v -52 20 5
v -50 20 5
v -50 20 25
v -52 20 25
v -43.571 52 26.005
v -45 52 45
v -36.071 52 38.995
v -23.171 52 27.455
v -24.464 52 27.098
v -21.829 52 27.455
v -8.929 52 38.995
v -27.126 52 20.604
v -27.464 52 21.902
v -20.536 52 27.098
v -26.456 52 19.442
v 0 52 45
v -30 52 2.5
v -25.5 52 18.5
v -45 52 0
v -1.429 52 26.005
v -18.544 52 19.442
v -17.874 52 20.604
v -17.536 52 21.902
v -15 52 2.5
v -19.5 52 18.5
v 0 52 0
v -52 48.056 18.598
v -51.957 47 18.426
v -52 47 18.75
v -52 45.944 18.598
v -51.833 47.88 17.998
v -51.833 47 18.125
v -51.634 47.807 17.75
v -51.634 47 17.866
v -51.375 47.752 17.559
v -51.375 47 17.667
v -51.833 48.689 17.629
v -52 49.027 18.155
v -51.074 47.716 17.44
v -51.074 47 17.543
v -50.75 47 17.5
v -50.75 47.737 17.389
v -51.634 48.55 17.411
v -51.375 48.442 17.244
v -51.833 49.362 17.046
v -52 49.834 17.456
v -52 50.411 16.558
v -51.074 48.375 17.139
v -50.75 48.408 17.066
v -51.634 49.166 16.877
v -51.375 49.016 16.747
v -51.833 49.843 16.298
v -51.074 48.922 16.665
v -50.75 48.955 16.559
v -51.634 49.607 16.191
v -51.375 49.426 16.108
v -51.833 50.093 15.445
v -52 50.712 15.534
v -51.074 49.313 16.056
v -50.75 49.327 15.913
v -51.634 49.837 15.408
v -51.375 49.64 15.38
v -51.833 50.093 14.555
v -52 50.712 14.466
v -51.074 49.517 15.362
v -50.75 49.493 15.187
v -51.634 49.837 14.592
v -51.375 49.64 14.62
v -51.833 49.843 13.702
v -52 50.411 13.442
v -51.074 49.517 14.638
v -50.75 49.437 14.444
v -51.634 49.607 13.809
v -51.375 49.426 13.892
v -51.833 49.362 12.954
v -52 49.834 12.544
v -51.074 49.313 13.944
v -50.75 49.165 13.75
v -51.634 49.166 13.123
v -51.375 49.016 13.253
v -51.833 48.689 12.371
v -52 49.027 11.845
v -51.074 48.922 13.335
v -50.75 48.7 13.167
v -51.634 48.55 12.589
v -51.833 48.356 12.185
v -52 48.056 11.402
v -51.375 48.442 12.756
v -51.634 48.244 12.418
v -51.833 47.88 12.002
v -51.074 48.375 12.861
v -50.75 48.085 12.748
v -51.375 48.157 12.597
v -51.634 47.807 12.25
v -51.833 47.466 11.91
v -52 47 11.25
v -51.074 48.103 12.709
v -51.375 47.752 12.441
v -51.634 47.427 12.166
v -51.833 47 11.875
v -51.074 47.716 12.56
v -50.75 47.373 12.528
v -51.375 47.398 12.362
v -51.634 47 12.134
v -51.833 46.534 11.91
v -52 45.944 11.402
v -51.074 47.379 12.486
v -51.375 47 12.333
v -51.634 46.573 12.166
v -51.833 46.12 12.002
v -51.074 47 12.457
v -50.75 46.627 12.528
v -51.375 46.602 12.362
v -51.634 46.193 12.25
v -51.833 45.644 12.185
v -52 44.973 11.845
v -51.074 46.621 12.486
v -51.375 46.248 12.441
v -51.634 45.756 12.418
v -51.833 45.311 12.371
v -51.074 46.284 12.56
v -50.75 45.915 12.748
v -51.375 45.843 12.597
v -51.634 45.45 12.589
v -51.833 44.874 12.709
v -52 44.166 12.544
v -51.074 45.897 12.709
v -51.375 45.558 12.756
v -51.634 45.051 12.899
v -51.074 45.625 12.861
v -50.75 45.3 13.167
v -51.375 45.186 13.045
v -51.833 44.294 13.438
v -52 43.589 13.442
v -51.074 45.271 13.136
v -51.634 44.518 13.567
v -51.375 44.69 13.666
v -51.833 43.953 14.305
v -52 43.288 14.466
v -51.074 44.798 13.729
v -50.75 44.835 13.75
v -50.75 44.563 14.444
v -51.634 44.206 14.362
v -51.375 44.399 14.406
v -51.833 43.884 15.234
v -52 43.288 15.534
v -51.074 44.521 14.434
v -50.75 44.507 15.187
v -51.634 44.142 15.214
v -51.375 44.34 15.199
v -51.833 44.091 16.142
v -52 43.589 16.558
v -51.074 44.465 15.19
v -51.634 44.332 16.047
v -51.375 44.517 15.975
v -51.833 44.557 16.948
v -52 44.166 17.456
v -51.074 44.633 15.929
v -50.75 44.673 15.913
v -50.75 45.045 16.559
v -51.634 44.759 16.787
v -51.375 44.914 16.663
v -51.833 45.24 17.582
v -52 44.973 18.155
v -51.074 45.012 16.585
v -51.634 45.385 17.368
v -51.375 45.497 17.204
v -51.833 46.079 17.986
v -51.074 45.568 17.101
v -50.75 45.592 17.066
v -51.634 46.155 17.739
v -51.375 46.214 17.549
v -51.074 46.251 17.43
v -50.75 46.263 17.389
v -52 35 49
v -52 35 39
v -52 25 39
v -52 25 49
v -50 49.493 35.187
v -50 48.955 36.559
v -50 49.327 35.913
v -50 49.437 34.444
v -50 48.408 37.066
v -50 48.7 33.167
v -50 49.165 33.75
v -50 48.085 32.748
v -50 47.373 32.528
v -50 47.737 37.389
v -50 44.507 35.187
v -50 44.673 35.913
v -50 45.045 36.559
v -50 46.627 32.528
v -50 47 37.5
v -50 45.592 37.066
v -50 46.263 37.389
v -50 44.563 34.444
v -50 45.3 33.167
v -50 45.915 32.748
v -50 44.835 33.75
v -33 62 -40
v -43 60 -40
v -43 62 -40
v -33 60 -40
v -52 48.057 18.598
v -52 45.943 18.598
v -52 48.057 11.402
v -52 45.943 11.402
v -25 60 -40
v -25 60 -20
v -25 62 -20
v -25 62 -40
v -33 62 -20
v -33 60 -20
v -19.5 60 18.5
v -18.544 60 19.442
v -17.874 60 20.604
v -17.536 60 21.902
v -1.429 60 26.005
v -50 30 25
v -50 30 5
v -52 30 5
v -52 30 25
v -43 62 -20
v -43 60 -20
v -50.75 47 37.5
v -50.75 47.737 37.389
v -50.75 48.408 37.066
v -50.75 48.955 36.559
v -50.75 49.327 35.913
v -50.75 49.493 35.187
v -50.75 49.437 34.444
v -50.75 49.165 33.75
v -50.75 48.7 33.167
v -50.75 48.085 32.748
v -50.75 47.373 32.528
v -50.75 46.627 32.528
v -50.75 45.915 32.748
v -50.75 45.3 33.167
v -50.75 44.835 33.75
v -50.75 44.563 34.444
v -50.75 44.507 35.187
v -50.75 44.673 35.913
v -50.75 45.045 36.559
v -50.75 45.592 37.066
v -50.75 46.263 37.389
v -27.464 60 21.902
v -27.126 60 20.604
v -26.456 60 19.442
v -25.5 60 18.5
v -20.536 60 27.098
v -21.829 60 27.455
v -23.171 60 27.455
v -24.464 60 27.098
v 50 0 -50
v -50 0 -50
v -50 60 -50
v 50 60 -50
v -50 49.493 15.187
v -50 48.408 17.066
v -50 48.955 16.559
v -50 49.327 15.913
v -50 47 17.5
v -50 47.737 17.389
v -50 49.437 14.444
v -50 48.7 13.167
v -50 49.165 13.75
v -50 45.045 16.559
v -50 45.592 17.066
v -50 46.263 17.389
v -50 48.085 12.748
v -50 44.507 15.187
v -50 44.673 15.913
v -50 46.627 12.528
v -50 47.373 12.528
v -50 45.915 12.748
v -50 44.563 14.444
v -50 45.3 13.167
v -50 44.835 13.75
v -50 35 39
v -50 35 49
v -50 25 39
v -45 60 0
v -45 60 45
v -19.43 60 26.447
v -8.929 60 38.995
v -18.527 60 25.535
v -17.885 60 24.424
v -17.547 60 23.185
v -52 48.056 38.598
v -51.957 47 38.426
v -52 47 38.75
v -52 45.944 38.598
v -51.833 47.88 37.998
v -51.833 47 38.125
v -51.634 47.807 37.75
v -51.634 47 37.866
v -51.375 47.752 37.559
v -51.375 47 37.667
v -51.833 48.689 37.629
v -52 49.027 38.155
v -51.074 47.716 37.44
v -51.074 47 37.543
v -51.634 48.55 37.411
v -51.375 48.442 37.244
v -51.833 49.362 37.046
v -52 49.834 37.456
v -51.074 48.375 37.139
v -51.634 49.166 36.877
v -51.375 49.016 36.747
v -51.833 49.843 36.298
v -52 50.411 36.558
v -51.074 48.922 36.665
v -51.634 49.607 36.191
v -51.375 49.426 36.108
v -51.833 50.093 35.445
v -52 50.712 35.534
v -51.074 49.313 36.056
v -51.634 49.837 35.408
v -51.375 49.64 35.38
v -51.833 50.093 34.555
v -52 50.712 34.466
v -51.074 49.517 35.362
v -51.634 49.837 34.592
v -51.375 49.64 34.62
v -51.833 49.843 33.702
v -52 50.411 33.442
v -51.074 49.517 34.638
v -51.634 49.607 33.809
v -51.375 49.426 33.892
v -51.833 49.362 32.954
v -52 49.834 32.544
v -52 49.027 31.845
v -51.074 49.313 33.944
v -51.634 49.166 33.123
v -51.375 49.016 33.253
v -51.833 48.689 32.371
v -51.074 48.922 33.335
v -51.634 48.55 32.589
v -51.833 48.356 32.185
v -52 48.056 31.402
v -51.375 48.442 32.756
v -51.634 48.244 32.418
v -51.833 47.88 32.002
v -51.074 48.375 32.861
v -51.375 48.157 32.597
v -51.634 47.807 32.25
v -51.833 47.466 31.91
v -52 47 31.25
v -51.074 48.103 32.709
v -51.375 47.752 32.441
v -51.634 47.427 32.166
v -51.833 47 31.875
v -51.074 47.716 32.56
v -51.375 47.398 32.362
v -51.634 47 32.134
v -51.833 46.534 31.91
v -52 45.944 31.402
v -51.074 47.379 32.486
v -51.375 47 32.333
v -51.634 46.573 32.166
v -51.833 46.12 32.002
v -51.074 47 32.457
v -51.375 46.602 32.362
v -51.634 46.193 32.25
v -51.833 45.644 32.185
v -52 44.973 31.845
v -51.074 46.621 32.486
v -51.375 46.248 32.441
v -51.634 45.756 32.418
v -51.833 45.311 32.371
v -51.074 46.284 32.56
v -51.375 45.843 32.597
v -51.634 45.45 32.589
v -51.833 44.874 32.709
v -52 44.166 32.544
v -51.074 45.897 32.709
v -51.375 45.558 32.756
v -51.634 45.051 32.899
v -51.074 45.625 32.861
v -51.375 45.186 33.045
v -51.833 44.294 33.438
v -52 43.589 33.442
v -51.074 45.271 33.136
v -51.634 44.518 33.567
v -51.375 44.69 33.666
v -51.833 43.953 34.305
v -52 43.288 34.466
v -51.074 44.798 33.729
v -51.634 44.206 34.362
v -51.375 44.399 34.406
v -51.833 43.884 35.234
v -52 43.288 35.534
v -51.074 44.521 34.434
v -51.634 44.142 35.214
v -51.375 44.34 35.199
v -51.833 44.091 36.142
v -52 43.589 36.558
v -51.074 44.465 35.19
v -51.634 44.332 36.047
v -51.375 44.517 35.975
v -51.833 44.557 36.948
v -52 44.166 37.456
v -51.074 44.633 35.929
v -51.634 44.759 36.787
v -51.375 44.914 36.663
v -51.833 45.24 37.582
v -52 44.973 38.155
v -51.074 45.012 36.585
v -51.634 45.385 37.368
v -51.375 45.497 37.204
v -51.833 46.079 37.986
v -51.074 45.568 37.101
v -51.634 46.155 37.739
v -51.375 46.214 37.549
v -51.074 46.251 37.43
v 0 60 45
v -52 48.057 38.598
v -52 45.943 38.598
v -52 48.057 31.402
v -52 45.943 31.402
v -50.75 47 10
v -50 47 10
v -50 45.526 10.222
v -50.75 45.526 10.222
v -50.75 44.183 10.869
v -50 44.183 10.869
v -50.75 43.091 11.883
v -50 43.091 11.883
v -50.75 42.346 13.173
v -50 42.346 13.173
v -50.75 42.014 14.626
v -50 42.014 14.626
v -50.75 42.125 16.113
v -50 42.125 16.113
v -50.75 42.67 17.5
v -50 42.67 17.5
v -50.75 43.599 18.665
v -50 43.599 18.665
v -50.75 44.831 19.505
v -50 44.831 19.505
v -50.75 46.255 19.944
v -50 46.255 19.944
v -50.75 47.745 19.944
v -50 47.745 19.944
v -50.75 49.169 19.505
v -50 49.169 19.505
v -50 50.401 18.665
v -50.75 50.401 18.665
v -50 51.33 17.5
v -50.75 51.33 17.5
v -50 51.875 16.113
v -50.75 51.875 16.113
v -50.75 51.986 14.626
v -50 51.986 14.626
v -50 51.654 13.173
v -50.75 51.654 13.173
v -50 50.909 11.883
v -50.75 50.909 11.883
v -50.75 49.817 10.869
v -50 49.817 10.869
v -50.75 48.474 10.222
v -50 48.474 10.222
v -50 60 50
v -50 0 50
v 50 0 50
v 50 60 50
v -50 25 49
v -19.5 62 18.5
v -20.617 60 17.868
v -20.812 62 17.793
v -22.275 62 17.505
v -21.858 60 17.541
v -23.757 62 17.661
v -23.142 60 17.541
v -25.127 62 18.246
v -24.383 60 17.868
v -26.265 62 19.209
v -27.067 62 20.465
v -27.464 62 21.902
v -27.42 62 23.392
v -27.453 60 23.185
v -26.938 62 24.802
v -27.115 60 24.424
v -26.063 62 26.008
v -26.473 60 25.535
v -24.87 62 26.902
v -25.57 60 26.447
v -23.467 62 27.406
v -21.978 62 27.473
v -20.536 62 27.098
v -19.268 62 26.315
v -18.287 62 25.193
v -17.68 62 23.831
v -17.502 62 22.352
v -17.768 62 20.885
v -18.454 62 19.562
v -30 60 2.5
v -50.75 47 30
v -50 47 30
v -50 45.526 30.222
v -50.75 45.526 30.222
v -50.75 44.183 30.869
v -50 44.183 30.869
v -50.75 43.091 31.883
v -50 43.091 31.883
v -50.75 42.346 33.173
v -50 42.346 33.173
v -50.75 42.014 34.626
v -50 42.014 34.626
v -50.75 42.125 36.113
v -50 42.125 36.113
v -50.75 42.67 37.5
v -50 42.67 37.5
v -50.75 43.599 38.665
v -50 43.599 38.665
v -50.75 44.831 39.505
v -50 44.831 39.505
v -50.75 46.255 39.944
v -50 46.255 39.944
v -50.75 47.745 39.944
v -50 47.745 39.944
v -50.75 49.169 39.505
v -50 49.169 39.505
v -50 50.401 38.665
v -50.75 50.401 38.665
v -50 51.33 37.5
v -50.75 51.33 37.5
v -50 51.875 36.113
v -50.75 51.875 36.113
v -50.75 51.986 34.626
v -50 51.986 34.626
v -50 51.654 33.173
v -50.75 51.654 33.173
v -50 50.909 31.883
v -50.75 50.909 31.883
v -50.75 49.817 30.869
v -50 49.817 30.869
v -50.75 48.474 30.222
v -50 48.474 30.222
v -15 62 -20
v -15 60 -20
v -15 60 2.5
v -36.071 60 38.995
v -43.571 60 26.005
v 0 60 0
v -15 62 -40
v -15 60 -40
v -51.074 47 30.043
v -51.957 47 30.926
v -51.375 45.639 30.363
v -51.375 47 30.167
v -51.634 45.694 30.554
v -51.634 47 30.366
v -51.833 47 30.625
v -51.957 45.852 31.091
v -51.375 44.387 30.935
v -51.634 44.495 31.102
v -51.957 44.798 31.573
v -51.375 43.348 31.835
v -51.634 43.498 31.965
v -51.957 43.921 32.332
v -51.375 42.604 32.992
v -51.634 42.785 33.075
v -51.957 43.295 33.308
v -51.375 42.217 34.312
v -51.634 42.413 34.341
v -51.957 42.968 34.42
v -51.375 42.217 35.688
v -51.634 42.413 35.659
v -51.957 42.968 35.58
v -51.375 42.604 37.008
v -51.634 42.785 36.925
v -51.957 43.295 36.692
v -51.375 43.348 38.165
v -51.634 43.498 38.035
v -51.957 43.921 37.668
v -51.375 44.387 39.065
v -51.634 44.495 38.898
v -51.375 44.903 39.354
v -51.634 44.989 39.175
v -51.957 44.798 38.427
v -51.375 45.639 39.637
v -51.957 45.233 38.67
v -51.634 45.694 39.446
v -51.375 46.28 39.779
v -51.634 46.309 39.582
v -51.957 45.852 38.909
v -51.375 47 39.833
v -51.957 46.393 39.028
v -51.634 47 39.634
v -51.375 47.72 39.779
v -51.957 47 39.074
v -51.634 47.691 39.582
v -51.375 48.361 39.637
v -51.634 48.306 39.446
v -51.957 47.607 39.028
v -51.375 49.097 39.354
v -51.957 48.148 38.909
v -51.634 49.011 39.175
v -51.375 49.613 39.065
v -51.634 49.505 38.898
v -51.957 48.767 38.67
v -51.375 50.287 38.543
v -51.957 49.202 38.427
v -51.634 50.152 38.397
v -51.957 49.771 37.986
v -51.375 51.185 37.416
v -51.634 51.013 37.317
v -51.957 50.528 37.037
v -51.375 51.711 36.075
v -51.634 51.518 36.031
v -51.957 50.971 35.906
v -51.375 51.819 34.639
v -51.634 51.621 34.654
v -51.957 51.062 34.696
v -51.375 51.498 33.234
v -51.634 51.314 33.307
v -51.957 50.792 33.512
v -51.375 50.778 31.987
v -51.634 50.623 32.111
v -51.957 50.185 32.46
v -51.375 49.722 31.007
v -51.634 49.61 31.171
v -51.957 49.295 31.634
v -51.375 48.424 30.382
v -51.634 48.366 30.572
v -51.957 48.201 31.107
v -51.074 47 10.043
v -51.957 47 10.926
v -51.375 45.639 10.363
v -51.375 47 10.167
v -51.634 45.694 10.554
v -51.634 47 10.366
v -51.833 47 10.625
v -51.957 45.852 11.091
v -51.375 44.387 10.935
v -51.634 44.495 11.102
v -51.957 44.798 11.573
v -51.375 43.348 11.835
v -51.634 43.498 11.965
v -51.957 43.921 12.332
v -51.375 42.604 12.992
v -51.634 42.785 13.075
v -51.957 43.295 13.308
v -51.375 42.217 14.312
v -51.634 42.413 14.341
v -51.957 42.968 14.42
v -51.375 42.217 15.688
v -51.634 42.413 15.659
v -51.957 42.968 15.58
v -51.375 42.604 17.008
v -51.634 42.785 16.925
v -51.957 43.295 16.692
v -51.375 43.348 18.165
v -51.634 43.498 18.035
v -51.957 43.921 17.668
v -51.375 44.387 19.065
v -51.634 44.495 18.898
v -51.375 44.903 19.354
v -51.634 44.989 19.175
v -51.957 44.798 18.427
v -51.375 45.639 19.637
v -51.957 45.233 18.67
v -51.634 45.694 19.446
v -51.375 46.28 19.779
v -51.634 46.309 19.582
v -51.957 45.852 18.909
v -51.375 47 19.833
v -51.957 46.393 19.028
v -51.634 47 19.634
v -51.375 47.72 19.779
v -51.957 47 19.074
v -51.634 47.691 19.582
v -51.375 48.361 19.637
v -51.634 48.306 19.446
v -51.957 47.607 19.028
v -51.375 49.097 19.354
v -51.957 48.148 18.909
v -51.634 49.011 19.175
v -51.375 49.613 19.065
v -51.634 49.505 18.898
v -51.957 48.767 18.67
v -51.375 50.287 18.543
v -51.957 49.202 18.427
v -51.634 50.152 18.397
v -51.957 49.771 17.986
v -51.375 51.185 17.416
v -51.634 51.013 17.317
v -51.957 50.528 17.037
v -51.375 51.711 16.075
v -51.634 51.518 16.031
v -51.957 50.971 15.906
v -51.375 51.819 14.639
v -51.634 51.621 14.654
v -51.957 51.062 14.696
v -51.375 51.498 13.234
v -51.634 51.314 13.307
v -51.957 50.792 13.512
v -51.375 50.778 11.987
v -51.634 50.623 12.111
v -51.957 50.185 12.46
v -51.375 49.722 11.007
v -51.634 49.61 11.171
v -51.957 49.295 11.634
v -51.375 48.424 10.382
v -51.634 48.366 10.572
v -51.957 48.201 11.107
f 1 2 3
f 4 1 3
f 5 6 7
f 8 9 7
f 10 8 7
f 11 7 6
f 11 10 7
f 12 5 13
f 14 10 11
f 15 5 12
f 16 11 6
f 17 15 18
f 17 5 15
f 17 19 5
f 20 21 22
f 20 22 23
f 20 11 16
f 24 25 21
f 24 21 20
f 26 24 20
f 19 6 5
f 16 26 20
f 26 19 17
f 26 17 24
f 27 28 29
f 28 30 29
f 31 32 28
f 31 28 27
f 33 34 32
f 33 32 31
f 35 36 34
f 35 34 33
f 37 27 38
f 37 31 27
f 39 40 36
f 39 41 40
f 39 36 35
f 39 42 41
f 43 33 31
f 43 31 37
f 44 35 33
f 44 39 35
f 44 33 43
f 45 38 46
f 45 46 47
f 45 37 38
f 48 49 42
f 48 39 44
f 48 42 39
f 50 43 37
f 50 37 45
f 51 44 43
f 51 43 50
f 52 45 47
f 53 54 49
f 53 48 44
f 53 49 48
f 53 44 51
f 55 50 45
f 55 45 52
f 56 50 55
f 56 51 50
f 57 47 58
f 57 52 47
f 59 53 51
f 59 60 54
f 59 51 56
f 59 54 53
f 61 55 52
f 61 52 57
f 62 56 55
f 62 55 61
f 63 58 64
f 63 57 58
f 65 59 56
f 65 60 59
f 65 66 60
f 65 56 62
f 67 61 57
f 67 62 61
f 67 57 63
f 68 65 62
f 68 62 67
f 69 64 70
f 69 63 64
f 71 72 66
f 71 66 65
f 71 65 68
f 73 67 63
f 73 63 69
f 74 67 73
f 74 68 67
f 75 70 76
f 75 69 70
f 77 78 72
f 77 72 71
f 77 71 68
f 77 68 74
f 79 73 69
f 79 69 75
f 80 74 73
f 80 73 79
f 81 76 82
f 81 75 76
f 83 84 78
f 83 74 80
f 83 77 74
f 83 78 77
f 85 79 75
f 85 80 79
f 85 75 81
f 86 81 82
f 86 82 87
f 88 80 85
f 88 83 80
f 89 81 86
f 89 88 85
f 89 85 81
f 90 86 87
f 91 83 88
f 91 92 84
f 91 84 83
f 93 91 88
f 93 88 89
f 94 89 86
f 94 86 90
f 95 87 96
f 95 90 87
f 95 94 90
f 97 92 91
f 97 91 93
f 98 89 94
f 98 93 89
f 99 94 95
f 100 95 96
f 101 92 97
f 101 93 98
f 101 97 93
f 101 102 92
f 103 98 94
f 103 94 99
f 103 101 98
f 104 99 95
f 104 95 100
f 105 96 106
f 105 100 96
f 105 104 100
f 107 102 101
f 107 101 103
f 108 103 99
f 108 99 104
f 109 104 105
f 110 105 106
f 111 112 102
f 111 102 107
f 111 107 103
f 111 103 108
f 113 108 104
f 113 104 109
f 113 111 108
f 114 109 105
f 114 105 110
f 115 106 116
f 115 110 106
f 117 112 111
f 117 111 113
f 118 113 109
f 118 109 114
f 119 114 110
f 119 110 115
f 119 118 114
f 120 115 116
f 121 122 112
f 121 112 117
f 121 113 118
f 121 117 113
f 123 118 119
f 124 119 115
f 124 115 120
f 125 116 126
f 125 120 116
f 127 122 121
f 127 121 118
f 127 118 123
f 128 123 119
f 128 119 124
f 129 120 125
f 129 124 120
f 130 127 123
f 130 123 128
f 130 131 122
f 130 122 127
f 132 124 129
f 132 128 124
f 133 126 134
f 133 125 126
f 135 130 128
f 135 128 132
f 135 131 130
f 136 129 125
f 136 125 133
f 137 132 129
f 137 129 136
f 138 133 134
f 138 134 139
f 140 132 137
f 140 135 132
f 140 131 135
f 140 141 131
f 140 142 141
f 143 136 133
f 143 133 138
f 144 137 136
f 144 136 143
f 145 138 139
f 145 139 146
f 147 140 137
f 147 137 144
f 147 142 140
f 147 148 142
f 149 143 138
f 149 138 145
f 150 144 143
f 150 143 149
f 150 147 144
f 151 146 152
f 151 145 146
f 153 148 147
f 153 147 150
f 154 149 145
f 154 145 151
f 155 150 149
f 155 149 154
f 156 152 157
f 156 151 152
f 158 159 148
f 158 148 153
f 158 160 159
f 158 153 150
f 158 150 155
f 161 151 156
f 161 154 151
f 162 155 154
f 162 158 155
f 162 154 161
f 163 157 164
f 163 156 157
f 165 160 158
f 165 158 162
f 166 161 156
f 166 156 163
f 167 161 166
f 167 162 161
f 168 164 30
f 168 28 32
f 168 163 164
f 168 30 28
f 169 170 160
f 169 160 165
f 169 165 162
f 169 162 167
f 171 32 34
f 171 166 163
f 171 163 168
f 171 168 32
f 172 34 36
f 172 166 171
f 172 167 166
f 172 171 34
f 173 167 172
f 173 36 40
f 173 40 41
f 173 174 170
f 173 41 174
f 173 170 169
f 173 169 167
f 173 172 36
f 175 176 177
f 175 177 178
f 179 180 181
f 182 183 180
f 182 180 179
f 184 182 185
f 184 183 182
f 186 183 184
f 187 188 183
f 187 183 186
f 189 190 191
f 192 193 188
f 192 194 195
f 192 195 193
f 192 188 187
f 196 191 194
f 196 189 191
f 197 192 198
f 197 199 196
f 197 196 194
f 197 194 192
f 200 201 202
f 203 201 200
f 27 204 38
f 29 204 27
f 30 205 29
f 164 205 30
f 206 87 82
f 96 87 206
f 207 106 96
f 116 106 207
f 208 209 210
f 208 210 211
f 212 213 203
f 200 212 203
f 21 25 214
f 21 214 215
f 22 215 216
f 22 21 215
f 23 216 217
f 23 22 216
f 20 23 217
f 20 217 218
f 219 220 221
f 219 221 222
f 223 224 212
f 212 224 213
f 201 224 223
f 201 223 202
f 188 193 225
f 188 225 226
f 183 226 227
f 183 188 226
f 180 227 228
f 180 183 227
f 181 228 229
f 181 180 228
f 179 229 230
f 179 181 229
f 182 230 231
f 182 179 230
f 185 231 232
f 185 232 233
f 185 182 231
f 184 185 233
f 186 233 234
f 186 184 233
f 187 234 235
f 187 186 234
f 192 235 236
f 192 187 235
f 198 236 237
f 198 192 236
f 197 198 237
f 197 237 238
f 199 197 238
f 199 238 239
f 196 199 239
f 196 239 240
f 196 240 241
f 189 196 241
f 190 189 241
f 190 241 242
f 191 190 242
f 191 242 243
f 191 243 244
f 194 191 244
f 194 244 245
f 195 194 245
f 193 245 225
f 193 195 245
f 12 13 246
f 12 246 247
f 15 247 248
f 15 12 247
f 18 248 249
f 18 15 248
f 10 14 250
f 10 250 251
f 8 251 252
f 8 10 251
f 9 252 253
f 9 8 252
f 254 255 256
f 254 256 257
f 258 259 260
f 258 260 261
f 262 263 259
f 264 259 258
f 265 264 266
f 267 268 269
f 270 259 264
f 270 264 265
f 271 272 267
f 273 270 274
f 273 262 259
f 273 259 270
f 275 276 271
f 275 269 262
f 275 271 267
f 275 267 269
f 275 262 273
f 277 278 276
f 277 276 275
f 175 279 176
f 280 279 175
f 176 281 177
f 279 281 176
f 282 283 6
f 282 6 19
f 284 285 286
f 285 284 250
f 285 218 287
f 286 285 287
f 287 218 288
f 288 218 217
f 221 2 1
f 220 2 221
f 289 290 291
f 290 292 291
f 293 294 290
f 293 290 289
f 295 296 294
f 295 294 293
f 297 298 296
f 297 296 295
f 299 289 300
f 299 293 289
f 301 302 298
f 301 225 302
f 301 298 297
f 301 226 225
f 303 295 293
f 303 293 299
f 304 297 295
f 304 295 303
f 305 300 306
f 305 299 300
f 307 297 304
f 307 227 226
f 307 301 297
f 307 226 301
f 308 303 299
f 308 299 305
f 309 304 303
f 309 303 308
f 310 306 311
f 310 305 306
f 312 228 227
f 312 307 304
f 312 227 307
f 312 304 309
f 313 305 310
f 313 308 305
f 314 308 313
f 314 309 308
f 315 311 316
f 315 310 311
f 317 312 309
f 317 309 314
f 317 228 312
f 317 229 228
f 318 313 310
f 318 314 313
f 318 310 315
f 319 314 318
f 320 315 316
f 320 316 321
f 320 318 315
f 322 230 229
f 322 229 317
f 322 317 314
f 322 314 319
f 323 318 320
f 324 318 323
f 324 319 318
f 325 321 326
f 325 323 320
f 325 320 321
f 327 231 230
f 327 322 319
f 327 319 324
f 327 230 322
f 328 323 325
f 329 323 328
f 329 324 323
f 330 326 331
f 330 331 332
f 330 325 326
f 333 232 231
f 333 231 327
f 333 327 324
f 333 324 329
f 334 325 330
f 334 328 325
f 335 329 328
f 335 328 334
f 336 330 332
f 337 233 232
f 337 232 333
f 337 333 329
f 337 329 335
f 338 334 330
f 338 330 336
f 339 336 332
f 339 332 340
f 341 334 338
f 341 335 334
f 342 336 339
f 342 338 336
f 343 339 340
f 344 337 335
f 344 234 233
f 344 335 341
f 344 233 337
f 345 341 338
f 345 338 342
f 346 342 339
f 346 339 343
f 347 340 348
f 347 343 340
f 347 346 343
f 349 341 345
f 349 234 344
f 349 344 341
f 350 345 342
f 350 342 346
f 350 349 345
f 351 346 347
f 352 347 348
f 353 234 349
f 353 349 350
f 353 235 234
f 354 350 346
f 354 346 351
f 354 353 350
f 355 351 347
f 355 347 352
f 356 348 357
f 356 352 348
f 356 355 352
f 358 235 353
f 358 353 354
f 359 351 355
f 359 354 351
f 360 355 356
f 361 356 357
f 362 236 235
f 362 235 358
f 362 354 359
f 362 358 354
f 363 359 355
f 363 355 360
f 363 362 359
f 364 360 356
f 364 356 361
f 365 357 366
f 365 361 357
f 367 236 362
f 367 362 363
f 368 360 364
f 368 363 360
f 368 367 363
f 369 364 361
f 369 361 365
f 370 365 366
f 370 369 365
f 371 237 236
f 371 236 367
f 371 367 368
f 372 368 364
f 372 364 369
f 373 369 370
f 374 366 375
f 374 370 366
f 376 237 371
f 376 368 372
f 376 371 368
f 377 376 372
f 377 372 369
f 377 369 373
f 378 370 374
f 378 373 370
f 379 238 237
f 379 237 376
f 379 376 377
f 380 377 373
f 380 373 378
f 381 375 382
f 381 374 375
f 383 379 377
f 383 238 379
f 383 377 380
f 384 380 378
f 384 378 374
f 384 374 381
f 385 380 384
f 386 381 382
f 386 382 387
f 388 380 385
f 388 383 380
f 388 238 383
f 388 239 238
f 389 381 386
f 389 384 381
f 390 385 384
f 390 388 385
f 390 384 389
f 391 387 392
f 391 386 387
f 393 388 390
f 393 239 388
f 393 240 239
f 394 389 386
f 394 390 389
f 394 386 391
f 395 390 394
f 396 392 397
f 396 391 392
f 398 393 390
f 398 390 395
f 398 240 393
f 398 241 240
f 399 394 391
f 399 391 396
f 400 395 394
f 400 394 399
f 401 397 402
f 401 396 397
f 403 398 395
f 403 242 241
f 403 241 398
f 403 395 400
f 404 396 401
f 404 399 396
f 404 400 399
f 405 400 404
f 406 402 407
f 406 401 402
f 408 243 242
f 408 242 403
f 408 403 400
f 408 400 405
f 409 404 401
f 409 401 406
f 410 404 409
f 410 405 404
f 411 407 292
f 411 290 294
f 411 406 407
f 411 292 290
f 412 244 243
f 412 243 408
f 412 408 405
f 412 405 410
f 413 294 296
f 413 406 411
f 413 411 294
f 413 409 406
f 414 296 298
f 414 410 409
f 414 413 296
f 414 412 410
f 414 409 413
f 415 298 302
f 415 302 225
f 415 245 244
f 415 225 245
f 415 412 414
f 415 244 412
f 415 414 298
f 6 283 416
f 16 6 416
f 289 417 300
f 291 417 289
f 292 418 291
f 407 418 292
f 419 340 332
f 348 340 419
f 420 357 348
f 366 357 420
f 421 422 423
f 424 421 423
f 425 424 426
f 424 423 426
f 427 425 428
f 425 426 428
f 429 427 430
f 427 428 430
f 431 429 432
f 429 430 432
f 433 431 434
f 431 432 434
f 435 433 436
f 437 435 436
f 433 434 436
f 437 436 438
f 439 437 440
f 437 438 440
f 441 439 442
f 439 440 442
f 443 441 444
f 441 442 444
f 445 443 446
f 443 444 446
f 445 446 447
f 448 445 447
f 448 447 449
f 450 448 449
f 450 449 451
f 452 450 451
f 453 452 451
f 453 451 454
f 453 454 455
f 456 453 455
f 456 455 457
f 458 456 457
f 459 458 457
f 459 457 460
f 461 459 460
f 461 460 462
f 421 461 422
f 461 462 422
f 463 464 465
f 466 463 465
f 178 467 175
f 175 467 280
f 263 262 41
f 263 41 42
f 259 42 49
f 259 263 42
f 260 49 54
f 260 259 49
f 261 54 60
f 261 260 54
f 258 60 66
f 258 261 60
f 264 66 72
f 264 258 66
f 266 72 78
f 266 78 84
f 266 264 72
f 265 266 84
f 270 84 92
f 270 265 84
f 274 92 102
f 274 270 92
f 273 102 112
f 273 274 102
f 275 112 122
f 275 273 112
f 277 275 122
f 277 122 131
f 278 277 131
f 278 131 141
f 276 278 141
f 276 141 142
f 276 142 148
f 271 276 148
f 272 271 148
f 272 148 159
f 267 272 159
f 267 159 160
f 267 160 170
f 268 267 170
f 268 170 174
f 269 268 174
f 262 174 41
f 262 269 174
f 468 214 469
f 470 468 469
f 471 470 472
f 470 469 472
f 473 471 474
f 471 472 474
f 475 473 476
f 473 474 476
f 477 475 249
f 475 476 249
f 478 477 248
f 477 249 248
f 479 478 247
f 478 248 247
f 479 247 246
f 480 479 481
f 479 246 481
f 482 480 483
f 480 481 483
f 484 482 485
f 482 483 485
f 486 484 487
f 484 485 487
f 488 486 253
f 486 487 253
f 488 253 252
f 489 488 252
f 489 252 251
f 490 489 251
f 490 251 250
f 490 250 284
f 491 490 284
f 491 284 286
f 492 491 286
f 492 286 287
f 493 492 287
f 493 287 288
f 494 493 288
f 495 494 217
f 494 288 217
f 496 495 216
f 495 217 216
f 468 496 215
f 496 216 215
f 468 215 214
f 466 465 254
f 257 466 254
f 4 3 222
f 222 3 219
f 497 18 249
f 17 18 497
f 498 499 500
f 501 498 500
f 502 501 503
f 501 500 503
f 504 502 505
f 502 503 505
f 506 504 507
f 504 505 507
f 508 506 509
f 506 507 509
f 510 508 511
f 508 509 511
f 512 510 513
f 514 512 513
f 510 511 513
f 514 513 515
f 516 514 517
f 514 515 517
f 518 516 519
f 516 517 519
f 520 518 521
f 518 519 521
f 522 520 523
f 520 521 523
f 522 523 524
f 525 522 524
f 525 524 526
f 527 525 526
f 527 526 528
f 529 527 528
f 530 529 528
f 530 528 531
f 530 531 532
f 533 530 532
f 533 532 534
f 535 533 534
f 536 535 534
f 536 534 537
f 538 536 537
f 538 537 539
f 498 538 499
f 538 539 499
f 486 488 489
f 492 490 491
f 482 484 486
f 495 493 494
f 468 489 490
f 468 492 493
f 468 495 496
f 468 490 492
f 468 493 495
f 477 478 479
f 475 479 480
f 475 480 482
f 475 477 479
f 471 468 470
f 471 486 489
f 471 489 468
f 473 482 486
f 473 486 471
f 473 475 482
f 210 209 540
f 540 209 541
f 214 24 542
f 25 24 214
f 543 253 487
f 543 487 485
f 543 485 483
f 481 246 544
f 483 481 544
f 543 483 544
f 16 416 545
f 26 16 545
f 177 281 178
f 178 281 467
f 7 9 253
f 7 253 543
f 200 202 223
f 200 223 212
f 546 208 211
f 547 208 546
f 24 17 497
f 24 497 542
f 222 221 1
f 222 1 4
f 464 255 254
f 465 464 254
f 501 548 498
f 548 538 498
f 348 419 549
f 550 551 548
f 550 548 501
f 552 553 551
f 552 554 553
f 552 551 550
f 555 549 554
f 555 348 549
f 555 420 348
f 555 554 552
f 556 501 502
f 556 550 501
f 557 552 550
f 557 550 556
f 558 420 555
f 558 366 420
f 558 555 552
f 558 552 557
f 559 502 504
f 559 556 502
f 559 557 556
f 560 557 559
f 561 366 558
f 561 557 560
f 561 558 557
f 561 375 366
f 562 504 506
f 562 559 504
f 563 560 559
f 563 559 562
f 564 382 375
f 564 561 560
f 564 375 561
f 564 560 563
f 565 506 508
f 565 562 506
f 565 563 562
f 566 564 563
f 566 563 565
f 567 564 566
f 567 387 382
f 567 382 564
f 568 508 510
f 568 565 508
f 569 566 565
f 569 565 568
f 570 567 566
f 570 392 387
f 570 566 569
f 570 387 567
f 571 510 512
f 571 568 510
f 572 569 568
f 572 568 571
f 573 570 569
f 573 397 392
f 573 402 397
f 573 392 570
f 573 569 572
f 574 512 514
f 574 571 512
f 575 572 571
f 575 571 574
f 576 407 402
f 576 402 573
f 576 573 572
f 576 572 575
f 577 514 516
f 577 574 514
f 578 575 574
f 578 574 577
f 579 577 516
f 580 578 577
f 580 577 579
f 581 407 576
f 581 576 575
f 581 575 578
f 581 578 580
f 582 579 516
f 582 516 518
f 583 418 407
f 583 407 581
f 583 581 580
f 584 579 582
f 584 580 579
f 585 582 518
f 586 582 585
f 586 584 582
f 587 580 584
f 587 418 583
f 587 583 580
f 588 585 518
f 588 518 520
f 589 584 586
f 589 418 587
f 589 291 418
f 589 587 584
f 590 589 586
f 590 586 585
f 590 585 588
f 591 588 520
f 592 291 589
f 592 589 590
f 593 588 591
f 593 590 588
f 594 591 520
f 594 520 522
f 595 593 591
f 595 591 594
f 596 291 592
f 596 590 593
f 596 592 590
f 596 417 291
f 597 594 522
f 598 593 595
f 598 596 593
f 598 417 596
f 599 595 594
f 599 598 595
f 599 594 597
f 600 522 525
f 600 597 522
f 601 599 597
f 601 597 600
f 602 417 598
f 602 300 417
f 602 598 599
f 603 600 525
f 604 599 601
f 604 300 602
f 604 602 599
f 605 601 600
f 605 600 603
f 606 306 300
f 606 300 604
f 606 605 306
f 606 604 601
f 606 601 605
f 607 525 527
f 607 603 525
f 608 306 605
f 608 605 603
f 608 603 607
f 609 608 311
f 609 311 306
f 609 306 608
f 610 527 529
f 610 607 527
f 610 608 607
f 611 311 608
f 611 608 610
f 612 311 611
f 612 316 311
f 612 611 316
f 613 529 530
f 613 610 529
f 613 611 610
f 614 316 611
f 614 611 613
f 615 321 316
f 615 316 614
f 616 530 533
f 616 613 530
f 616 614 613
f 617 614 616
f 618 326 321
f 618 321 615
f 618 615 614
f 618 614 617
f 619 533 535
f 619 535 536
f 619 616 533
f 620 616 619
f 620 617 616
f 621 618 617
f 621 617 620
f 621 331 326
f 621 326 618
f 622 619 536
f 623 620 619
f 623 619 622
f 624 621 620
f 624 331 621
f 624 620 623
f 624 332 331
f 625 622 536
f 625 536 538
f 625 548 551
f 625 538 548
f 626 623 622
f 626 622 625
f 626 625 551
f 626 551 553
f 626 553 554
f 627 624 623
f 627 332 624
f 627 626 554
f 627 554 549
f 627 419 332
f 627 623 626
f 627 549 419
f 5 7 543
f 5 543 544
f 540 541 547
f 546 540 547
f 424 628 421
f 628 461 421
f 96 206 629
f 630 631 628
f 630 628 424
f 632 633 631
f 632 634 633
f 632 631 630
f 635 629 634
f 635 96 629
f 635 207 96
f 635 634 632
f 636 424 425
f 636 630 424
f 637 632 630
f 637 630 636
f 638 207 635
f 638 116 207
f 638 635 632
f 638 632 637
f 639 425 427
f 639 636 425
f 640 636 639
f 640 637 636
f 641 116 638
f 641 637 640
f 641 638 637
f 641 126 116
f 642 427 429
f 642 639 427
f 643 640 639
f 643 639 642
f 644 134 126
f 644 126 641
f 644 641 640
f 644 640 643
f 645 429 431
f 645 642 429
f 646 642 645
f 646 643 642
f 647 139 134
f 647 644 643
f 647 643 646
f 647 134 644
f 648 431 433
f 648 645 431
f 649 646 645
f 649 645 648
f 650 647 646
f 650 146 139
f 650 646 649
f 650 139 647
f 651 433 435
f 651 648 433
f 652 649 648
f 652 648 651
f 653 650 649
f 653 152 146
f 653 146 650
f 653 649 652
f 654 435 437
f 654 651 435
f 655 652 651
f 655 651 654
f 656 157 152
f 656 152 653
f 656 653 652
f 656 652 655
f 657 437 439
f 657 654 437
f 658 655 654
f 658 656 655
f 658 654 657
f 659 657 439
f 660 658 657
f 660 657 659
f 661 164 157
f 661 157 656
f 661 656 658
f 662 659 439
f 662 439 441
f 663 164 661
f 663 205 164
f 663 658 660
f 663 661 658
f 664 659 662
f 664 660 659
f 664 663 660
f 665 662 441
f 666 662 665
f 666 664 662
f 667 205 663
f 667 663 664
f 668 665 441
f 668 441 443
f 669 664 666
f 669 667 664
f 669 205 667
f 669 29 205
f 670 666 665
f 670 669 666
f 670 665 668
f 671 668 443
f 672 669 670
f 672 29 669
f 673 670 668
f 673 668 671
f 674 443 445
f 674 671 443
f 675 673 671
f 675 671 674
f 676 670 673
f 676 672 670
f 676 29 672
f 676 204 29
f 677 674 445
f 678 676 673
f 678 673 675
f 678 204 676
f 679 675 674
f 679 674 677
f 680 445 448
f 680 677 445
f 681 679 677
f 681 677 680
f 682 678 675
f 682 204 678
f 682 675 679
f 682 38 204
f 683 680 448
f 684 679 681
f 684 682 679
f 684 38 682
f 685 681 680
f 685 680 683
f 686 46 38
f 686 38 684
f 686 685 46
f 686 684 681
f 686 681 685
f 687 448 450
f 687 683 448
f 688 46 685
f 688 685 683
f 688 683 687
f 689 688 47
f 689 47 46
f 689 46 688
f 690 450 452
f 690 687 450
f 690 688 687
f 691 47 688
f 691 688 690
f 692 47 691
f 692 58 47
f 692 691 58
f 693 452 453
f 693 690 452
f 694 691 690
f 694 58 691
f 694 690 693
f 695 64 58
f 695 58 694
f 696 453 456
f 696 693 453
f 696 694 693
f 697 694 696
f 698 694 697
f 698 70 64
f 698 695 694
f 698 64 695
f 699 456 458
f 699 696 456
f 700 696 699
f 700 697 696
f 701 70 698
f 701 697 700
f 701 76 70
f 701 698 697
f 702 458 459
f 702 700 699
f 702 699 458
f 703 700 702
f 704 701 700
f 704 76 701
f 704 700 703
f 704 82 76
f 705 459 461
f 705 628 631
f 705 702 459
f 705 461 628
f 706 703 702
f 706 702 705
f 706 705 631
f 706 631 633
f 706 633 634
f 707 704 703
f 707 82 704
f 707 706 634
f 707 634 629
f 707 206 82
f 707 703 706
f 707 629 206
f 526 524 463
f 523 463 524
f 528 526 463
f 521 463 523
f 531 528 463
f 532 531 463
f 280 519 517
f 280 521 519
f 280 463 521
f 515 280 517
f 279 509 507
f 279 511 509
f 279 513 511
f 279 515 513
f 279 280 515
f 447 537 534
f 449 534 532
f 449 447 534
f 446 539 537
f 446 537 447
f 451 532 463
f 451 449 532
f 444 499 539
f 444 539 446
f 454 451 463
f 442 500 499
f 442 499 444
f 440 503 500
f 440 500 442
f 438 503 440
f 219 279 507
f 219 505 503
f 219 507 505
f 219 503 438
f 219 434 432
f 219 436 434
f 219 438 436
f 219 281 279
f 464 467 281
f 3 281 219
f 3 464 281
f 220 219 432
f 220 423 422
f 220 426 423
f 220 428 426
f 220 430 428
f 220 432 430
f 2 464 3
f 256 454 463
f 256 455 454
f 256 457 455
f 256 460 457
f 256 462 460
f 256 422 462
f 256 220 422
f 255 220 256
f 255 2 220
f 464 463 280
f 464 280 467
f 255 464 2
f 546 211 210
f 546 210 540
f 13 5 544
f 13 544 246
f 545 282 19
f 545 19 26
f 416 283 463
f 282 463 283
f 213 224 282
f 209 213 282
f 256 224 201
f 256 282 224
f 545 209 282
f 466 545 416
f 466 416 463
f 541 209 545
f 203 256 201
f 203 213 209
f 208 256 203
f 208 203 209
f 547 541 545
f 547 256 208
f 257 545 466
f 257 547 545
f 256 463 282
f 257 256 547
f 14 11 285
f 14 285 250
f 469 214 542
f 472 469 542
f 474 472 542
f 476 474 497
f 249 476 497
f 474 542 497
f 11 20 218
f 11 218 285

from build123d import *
from build123d.topology import SkipClean

# Parameters (mm, degrees)
SKETCH_1_W          = 100
SKETCH_1_H          = 100
EXTRUDE_1_DEPTH     = 60
SKETCH_2_W          = 45
SKETCH_2_H          = 45
CUT_EXTRUDE_1_DEPTH = 8
SKETCH_3_W          = 10
SKETCH_3_H          = 20
EXTRUDE_2_DEPTH     = 2
SKETCH_4_W          = 20
SKETCH_4_H          = 10
SKETCH_4_W_2        = 10
EXTRUDE_3_DEPTH     = 2
SKETCH_5_R          = 5
SKETCH_5_R_2        = 2.5
EXTRUDE_4_DEPTH     = 2
FILLET_1_R          = 1.25
FILLET_2_R          = 1.25
EXTRUDE_5_DEPTH     = 8
SKETCH_7_R          = 5
EXTRUDE_6_DEPTH     = 2


with BuildPart() as part:
    # 草图1 → 凸台-拉伸1 (new body)
    with BuildSketch(Plane(origin=(0, 0, 0), x_dir=(1, 0, 0), z_dir=(0, 1, 0))):
        Rectangle(SKETCH_1_W, SKETCH_1_H)
    extrude(amount=EXTRUDE_1_DEPTH)

    # 草图2 → 切除-拉伸1 (cut)
    with BuildSketch(Plane(origin=(0, 60, 0), x_dir=(1, 0, 0), z_dir=(0, 1, 0))):
        with Locations((-22.5, -22.5)):
            Rectangle(SKETCH_2_W, SKETCH_2_H)
    extrude(amount=-CUT_EXTRUDE_1_DEPTH, mode=Mode.SUBTRACT)

    # 草图3 → 凸台-拉伸2 (add)
    with BuildSketch(Plane(origin=(0, 60, 0), x_dir=(1, 0, 0), z_dir=(0, 1, 0))):
        with Locations((-38, 30)):
            Rectangle(SKETCH_3_W, SKETCH_3_H)
        with Locations((-20, 30)):
            Rectangle(SKETCH_3_W, SKETCH_3_H)
    extrude(amount=EXTRUDE_2_DEPTH)

    # 草图4 → 凸台-拉伸3 (add)
    with BuildSketch(Plane.ZY.offset(50)):
        with Locations((15, 25)):
            Rectangle(SKETCH_4_W, SKETCH_4_H)
        with Locations((44, 30)):
            Rectangle(SKETCH_4_W_2, SKETCH_4_H)
    extrude(amount=EXTRUDE_3_DEPTH)

    # 草图5 → 凸台-拉伸4 (add)
    # profile 1 of 2: a face of its own
    with BuildSketch(Plane.ZY.offset(50)):
        with Locations(Location((15, 47, 0), (0, 0, 180))):
            Circle(SKETCH_5_R)
        with Locations((15, 47)):
            Circle(SKETCH_5_R_2, mode=Mode.SUBTRACT)
    # profile 2 of 2: a face of its own
    with BuildSketch(Plane.ZY.offset(50)):
        with Locations(Location((35, 47, 0), (0, 0, 180))):
            Circle(SKETCH_5_R)
        with Locations((35, 47)):
            Circle(SKETCH_5_R_2, mode=Mode.SUBTRACT)
    extrude(amount=EXTRUDE_4_DEPTH)

    # 圆角1
    fillet_1_edges = [part.edges().sort_by_distance(p)[0] for p in [
        (-52, 47, 20),
        (-52, 47, 12.5),
    ]]
    fillet(fillet_1_edges, radius=FILLET_1_R - 0.0001)  # a hair under: the kernel refuses the full size

    # 圆角2
    fillet_2_edges = [part.edges().sort_by_distance(p)[0] for p in [
        (-52, 47, 40),
        (-52, 47, 32.5),
    ]]
    fillet(fillet_2_edges, radius=FILLET_2_R - 0.0001)  # a hair under: the kernel refuses the full size

    # 草图6 → 凸台-拉伸5 (add)
    with BuildSketch(Plane(origin=(0, 52, 0), x_dir=(1, 0, 0), z_dir=(0, 1, 0))):
        with BuildLine():
            Line((-25.5, -18.5), (-30, -2.5))
            Line((-30, -2.5), (-15, -2.5))
            Line((-15, -2.5), (-19.5, -18.5))
            ThreePointArc((-19.5, -18.5), (-18.169872981, -20), (-17.535898385, -21.901923789))
            Line((-17.535898385, -21.901923789), (-1.429491924, -26.004809472))
            Line((-1.429491924, -26.004809472), (-8.929491924, -38.995190528))
            Line((-8.929491924, -38.995190528), (-20.535898385, -27.098076211))
            ThreePointArc((-20.535898385, -27.098076211), (-22.5, -27.5), (-24.464101615, -27.098076211))
            Line((-24.464101615, -27.098076211), (-36.070508076, -38.995190528))
            Line((-36.070508076, -38.995190528), (-43.570508076, -26.004809472))
            Line((-43.570508076, -26.004809472), (-27.464101615, -21.901923789))
            ThreePointArc((-27.464101615, -21.901923789), (-26.830127019, -20), (-25.5, -18.5))
        make_face()
    extrude(amount=EXTRUDE_5_DEPTH)

    # 草图7 → 凸台-拉伸6 (add)
    with SkipClean():  # the faces are left unmerged after this step: merging them gives an invalid solid
        with BuildSketch(Plane(origin=(0, 60, 0), x_dir=(1, 0, 0), z_dir=(0, 1, 0))):
            with Locations(Location((-22.5, -22.5, 0), (0, 0, 53.130102354))):
                Circle(SKETCH_7_R)
        extrude(amount=EXTRUDE_6_DEPTH)


solid = part.part
